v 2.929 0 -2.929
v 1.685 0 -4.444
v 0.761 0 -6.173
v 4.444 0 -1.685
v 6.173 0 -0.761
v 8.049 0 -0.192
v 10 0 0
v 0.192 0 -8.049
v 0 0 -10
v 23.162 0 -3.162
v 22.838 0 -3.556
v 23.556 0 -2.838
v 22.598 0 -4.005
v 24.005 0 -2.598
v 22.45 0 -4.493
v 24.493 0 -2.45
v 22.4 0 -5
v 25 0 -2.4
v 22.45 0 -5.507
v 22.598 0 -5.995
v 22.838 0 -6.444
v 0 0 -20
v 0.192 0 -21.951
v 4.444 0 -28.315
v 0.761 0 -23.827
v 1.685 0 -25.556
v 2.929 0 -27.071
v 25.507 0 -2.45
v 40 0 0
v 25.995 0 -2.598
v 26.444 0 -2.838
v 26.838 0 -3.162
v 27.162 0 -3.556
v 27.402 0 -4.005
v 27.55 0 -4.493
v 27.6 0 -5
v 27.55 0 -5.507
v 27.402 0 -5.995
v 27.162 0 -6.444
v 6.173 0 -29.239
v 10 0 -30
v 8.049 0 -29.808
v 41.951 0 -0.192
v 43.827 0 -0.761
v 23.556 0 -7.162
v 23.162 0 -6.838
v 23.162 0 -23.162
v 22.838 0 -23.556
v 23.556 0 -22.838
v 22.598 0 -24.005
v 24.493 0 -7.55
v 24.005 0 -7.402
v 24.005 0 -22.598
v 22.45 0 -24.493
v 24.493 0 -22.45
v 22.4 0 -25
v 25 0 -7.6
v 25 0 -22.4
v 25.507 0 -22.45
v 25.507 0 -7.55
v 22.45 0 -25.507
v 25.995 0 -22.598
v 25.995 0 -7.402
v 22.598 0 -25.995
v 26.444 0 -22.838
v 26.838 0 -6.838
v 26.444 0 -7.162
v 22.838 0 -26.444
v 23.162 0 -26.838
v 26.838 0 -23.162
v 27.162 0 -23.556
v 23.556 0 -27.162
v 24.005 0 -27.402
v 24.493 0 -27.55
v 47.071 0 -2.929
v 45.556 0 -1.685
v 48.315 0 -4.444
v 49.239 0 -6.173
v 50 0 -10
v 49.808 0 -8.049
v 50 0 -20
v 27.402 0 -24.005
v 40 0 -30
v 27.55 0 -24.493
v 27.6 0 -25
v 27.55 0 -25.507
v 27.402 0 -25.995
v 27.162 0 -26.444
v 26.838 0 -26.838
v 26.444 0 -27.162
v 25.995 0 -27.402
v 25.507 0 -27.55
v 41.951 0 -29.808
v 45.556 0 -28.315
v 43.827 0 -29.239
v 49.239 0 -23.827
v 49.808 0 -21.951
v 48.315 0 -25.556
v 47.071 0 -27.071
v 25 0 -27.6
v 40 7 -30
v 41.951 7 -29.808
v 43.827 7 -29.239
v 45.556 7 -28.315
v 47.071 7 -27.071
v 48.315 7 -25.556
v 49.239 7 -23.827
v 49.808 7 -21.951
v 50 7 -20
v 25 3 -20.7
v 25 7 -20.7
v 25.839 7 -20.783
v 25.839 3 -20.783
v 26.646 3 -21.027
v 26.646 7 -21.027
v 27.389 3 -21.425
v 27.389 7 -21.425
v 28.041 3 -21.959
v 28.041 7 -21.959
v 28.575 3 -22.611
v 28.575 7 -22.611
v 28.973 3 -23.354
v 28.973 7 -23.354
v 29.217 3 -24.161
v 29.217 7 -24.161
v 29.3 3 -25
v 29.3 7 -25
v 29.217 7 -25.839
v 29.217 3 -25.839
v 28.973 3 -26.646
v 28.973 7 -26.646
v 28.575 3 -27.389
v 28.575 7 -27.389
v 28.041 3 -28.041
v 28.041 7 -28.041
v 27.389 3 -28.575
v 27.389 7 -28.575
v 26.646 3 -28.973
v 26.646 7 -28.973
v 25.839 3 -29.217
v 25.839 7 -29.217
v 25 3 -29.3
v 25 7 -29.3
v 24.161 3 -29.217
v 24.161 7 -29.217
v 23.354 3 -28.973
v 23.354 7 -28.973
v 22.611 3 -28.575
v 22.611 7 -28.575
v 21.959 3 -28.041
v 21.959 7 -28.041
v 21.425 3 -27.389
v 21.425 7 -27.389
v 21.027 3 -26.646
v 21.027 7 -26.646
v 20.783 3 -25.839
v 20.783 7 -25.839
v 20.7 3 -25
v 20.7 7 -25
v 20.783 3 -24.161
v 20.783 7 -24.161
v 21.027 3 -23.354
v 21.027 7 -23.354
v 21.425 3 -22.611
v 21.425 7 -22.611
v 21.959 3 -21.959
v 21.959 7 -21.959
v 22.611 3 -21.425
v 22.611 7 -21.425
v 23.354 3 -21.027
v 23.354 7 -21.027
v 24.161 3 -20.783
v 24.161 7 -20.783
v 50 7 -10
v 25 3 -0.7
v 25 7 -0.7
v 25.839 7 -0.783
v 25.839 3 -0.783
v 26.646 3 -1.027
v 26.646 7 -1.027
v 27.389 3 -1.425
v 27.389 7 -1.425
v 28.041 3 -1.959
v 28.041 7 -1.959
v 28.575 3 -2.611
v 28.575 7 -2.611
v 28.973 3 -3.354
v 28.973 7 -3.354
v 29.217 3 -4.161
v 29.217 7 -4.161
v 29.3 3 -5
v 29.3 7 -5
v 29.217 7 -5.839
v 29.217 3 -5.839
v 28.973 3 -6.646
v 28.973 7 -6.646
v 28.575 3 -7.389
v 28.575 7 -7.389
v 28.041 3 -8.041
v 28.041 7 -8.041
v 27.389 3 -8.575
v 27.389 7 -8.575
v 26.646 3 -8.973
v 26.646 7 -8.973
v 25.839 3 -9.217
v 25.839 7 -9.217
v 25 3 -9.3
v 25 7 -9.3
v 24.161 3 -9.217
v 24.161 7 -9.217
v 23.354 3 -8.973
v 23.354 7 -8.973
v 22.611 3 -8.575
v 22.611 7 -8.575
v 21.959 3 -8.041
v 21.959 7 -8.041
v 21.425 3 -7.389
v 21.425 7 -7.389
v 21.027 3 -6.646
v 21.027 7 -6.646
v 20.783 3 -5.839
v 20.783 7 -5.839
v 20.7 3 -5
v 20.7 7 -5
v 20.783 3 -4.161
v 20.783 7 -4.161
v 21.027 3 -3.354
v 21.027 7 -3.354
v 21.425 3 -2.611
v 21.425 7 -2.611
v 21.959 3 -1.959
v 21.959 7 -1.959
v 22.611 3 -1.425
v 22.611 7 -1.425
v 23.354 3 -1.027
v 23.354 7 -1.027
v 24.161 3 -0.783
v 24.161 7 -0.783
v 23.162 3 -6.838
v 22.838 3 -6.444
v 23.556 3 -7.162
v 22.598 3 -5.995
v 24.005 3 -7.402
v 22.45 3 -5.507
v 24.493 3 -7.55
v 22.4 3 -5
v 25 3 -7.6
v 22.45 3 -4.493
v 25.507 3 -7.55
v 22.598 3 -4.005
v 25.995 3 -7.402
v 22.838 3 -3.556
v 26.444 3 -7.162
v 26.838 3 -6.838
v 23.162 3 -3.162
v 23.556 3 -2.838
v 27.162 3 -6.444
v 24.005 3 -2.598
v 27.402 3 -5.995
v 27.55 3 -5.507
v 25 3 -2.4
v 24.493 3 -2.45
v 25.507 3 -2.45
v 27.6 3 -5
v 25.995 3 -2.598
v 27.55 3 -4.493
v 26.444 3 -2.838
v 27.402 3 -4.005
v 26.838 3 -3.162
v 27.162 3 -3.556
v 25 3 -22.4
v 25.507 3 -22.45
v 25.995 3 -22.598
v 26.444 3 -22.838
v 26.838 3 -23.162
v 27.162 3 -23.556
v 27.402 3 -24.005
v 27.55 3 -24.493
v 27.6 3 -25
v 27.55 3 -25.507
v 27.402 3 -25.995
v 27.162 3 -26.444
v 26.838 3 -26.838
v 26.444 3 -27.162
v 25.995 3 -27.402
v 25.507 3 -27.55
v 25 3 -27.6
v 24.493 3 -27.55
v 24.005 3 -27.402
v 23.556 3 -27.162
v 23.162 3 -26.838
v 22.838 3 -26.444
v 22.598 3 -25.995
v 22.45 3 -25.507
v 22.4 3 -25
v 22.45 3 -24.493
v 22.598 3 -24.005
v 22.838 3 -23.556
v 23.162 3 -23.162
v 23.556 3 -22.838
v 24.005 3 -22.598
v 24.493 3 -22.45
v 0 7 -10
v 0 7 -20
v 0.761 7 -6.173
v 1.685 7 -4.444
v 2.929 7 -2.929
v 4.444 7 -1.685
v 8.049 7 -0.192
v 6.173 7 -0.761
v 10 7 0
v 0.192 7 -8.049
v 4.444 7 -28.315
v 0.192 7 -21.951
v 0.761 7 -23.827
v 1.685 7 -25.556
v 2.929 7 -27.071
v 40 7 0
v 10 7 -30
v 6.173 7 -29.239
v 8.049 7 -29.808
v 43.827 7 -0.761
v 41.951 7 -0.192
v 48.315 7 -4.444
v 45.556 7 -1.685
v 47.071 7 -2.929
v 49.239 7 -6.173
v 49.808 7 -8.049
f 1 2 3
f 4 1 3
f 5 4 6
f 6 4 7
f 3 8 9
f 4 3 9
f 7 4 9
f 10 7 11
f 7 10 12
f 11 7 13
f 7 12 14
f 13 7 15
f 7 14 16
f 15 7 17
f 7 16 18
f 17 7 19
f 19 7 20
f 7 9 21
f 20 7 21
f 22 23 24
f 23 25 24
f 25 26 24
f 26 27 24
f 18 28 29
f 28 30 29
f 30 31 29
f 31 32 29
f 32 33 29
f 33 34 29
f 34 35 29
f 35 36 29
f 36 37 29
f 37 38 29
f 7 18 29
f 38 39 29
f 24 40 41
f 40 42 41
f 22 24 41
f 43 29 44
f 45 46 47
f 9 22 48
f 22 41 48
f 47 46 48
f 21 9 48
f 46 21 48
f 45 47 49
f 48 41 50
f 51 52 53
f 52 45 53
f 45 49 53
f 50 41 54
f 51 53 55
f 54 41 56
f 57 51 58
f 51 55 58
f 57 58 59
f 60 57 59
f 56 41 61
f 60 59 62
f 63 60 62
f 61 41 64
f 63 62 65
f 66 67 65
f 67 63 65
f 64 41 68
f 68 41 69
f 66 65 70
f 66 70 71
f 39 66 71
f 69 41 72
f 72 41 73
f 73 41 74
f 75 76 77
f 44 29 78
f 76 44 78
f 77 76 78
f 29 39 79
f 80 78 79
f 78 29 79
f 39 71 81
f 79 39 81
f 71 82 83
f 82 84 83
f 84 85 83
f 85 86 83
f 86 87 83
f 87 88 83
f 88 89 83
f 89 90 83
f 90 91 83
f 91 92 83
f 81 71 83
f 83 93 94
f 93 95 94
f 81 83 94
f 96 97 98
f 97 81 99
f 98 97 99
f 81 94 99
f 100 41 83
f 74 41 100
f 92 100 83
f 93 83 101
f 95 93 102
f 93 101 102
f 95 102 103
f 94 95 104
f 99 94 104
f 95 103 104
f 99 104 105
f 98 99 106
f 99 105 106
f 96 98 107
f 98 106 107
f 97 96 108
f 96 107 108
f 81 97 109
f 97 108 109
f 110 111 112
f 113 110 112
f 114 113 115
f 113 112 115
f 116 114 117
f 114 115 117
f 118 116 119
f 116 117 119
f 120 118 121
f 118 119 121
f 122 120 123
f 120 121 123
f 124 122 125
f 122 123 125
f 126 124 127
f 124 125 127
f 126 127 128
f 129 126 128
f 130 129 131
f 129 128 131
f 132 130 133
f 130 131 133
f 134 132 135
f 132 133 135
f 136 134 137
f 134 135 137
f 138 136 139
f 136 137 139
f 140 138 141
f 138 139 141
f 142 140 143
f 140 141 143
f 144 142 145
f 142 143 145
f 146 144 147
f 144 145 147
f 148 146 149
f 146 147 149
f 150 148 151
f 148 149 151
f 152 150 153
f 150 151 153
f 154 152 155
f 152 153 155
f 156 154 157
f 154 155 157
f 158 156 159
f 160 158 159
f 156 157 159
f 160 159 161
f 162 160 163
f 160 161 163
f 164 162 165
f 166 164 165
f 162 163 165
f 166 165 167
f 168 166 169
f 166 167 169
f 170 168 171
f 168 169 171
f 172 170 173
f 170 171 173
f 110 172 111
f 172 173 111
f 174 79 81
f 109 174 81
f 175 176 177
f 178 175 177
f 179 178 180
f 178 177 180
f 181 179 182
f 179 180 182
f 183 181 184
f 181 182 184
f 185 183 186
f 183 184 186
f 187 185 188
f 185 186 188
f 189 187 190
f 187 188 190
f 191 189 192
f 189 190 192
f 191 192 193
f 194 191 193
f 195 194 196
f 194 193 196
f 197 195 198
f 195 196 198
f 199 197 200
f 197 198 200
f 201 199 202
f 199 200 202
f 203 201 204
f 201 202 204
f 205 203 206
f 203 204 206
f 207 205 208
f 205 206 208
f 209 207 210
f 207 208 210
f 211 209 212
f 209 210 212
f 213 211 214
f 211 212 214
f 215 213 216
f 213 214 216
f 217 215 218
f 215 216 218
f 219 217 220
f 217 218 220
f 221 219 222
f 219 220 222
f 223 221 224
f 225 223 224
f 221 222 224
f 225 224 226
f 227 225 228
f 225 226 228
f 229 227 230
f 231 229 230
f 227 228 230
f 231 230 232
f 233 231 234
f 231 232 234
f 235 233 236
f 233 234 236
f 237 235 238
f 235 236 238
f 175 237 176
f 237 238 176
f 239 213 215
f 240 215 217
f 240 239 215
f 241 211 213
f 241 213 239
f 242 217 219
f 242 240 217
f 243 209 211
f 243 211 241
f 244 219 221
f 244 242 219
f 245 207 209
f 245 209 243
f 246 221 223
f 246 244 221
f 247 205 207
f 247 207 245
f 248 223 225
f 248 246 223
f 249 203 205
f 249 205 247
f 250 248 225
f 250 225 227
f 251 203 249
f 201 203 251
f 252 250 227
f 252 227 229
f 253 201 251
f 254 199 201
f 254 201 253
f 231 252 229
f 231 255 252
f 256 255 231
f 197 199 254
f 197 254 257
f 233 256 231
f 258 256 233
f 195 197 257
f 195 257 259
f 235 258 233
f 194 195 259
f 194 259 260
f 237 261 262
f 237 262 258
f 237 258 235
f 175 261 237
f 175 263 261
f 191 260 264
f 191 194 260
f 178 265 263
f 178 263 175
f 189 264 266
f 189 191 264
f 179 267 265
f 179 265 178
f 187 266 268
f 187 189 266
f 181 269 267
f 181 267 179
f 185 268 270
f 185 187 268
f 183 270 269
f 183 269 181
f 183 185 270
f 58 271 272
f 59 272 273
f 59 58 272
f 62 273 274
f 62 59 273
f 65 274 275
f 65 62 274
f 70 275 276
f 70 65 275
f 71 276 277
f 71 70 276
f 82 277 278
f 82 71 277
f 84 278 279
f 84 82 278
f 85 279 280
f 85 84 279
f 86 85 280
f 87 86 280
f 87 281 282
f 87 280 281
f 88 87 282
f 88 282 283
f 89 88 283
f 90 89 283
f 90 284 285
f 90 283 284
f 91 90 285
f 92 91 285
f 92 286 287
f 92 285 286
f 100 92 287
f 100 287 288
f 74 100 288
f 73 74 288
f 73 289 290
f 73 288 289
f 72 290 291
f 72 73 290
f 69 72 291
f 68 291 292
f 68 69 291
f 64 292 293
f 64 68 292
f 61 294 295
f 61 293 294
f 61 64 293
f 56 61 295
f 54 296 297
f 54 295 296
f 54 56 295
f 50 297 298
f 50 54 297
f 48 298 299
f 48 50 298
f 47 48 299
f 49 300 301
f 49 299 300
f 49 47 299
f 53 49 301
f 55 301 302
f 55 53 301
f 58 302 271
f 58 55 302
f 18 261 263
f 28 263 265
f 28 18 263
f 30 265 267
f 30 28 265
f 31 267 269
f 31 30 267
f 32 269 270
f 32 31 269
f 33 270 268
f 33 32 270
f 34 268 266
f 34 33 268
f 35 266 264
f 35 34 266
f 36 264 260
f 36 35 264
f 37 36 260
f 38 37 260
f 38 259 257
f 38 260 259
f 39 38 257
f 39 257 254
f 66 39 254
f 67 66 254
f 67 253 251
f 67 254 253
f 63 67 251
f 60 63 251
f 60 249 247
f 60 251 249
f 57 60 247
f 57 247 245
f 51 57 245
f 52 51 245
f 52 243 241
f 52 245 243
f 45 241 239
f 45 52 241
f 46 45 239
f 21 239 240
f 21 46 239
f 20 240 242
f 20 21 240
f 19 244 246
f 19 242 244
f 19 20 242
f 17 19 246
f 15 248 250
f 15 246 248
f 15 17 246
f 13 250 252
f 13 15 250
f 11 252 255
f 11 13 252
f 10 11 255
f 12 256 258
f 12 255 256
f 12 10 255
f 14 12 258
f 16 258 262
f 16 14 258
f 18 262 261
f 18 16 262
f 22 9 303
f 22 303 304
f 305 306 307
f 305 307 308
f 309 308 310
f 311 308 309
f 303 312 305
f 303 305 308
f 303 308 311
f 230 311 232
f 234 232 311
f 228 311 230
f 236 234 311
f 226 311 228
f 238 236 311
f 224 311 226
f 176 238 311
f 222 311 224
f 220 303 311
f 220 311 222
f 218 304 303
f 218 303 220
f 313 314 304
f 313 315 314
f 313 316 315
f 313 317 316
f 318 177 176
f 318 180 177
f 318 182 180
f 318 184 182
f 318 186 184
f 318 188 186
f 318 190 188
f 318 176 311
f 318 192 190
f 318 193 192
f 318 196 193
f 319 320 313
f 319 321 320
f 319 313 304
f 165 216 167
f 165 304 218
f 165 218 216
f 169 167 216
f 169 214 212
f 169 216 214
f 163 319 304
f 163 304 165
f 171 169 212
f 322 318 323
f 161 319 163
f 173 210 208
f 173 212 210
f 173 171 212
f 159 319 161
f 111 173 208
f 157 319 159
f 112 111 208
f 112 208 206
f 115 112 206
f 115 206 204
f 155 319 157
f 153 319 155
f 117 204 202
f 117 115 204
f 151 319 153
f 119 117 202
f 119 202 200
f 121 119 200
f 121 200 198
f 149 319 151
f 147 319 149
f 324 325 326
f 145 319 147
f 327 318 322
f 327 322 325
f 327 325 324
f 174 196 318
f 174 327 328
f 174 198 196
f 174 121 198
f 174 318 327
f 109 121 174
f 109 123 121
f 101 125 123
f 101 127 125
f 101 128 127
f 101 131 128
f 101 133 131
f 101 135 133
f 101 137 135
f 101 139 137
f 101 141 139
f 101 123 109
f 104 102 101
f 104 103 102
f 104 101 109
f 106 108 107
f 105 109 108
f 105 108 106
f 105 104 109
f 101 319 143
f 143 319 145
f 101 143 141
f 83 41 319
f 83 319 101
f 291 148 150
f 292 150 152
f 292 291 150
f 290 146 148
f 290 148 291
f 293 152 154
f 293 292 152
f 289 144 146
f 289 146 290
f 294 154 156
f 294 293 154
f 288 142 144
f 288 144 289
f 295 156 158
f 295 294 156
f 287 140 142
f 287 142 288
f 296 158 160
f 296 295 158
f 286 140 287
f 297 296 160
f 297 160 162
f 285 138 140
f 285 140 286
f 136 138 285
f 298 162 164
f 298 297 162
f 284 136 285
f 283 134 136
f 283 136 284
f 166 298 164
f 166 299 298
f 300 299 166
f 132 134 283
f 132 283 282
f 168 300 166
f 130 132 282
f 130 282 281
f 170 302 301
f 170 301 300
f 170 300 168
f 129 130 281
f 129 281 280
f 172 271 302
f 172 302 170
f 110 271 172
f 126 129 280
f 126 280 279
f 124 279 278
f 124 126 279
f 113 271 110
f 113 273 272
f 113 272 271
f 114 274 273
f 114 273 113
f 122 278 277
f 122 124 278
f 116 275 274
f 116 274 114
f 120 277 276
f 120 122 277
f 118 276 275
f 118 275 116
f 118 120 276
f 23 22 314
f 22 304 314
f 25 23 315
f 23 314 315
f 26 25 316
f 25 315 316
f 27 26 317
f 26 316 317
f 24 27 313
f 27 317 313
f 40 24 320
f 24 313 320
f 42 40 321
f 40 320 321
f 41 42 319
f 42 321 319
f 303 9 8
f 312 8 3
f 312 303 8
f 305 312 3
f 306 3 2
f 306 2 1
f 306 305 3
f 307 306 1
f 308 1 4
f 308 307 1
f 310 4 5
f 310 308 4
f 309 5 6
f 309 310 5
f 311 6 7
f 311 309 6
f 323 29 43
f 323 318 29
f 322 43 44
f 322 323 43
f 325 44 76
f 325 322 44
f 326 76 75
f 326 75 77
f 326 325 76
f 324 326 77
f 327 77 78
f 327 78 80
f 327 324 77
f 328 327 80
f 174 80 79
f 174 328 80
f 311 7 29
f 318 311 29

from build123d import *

# Parameters (mm, degrees)
SKETCH1_W           = 50
SKETCH1_H           = 30
SKETCH1_R           = 2.6
BOSS_EXTRUDE1_DEPTH = 7
FILLET1_R           = 10
SKETCH2_R           = 4.3
CUT_EXTRUDE1_DEPTH  = 4


with BuildPart() as part:
    # Sketch1 → Boss-Extrude1 (new body)
    with BuildSketch(Plane(origin=(0, 0, 0), x_dir=(1, 0, 0), z_dir=(0, 1, 0))):
        with Locations((25, 15)):
            Rectangle(SKETCH1_W, SKETCH1_H)
        with Locations(Location((25, 25, 0), (0, 0, 270))):
            Circle(SKETCH1_R, mode=Mode.SUBTRACT)
        with Locations(Location((25, 5, 0), (0, 0, 270))):
            Circle(SKETCH1_R, mode=Mode.SUBTRACT)
    extrude(amount=BOSS_EXTRUDE1_DEPTH)

    # Fillet1
    fillet1_edges = [part.edges().sort_by_distance(p)[0] for p in [
        (0, 3.5, -30),
        (50, 3.5, -30),
        (50, 3.5, 0),
        (0, 3.5, 0),
    ]]
    fillet(fillet1_edges, radius=FILLET1_R)

    # Sketch2 → Cut-Extrude1 (cut)
    with BuildSketch(Plane(origin=(0, 7, 0), x_dir=(1, 0, 0), z_dir=(0, 1, 0))):
        with Locations(Location((25, 25, 0), (0, 0, 270))):
            Circle(SKETCH2_R)
        with Locations(Location((25, 5, 0), (0, 0, 270))):
            Circle(SKETCH2_R)
    extrude(amount=-CUT_EXTRUDE1_DEPTH, mode=Mode.SUBTRACT)


solid = part.part
